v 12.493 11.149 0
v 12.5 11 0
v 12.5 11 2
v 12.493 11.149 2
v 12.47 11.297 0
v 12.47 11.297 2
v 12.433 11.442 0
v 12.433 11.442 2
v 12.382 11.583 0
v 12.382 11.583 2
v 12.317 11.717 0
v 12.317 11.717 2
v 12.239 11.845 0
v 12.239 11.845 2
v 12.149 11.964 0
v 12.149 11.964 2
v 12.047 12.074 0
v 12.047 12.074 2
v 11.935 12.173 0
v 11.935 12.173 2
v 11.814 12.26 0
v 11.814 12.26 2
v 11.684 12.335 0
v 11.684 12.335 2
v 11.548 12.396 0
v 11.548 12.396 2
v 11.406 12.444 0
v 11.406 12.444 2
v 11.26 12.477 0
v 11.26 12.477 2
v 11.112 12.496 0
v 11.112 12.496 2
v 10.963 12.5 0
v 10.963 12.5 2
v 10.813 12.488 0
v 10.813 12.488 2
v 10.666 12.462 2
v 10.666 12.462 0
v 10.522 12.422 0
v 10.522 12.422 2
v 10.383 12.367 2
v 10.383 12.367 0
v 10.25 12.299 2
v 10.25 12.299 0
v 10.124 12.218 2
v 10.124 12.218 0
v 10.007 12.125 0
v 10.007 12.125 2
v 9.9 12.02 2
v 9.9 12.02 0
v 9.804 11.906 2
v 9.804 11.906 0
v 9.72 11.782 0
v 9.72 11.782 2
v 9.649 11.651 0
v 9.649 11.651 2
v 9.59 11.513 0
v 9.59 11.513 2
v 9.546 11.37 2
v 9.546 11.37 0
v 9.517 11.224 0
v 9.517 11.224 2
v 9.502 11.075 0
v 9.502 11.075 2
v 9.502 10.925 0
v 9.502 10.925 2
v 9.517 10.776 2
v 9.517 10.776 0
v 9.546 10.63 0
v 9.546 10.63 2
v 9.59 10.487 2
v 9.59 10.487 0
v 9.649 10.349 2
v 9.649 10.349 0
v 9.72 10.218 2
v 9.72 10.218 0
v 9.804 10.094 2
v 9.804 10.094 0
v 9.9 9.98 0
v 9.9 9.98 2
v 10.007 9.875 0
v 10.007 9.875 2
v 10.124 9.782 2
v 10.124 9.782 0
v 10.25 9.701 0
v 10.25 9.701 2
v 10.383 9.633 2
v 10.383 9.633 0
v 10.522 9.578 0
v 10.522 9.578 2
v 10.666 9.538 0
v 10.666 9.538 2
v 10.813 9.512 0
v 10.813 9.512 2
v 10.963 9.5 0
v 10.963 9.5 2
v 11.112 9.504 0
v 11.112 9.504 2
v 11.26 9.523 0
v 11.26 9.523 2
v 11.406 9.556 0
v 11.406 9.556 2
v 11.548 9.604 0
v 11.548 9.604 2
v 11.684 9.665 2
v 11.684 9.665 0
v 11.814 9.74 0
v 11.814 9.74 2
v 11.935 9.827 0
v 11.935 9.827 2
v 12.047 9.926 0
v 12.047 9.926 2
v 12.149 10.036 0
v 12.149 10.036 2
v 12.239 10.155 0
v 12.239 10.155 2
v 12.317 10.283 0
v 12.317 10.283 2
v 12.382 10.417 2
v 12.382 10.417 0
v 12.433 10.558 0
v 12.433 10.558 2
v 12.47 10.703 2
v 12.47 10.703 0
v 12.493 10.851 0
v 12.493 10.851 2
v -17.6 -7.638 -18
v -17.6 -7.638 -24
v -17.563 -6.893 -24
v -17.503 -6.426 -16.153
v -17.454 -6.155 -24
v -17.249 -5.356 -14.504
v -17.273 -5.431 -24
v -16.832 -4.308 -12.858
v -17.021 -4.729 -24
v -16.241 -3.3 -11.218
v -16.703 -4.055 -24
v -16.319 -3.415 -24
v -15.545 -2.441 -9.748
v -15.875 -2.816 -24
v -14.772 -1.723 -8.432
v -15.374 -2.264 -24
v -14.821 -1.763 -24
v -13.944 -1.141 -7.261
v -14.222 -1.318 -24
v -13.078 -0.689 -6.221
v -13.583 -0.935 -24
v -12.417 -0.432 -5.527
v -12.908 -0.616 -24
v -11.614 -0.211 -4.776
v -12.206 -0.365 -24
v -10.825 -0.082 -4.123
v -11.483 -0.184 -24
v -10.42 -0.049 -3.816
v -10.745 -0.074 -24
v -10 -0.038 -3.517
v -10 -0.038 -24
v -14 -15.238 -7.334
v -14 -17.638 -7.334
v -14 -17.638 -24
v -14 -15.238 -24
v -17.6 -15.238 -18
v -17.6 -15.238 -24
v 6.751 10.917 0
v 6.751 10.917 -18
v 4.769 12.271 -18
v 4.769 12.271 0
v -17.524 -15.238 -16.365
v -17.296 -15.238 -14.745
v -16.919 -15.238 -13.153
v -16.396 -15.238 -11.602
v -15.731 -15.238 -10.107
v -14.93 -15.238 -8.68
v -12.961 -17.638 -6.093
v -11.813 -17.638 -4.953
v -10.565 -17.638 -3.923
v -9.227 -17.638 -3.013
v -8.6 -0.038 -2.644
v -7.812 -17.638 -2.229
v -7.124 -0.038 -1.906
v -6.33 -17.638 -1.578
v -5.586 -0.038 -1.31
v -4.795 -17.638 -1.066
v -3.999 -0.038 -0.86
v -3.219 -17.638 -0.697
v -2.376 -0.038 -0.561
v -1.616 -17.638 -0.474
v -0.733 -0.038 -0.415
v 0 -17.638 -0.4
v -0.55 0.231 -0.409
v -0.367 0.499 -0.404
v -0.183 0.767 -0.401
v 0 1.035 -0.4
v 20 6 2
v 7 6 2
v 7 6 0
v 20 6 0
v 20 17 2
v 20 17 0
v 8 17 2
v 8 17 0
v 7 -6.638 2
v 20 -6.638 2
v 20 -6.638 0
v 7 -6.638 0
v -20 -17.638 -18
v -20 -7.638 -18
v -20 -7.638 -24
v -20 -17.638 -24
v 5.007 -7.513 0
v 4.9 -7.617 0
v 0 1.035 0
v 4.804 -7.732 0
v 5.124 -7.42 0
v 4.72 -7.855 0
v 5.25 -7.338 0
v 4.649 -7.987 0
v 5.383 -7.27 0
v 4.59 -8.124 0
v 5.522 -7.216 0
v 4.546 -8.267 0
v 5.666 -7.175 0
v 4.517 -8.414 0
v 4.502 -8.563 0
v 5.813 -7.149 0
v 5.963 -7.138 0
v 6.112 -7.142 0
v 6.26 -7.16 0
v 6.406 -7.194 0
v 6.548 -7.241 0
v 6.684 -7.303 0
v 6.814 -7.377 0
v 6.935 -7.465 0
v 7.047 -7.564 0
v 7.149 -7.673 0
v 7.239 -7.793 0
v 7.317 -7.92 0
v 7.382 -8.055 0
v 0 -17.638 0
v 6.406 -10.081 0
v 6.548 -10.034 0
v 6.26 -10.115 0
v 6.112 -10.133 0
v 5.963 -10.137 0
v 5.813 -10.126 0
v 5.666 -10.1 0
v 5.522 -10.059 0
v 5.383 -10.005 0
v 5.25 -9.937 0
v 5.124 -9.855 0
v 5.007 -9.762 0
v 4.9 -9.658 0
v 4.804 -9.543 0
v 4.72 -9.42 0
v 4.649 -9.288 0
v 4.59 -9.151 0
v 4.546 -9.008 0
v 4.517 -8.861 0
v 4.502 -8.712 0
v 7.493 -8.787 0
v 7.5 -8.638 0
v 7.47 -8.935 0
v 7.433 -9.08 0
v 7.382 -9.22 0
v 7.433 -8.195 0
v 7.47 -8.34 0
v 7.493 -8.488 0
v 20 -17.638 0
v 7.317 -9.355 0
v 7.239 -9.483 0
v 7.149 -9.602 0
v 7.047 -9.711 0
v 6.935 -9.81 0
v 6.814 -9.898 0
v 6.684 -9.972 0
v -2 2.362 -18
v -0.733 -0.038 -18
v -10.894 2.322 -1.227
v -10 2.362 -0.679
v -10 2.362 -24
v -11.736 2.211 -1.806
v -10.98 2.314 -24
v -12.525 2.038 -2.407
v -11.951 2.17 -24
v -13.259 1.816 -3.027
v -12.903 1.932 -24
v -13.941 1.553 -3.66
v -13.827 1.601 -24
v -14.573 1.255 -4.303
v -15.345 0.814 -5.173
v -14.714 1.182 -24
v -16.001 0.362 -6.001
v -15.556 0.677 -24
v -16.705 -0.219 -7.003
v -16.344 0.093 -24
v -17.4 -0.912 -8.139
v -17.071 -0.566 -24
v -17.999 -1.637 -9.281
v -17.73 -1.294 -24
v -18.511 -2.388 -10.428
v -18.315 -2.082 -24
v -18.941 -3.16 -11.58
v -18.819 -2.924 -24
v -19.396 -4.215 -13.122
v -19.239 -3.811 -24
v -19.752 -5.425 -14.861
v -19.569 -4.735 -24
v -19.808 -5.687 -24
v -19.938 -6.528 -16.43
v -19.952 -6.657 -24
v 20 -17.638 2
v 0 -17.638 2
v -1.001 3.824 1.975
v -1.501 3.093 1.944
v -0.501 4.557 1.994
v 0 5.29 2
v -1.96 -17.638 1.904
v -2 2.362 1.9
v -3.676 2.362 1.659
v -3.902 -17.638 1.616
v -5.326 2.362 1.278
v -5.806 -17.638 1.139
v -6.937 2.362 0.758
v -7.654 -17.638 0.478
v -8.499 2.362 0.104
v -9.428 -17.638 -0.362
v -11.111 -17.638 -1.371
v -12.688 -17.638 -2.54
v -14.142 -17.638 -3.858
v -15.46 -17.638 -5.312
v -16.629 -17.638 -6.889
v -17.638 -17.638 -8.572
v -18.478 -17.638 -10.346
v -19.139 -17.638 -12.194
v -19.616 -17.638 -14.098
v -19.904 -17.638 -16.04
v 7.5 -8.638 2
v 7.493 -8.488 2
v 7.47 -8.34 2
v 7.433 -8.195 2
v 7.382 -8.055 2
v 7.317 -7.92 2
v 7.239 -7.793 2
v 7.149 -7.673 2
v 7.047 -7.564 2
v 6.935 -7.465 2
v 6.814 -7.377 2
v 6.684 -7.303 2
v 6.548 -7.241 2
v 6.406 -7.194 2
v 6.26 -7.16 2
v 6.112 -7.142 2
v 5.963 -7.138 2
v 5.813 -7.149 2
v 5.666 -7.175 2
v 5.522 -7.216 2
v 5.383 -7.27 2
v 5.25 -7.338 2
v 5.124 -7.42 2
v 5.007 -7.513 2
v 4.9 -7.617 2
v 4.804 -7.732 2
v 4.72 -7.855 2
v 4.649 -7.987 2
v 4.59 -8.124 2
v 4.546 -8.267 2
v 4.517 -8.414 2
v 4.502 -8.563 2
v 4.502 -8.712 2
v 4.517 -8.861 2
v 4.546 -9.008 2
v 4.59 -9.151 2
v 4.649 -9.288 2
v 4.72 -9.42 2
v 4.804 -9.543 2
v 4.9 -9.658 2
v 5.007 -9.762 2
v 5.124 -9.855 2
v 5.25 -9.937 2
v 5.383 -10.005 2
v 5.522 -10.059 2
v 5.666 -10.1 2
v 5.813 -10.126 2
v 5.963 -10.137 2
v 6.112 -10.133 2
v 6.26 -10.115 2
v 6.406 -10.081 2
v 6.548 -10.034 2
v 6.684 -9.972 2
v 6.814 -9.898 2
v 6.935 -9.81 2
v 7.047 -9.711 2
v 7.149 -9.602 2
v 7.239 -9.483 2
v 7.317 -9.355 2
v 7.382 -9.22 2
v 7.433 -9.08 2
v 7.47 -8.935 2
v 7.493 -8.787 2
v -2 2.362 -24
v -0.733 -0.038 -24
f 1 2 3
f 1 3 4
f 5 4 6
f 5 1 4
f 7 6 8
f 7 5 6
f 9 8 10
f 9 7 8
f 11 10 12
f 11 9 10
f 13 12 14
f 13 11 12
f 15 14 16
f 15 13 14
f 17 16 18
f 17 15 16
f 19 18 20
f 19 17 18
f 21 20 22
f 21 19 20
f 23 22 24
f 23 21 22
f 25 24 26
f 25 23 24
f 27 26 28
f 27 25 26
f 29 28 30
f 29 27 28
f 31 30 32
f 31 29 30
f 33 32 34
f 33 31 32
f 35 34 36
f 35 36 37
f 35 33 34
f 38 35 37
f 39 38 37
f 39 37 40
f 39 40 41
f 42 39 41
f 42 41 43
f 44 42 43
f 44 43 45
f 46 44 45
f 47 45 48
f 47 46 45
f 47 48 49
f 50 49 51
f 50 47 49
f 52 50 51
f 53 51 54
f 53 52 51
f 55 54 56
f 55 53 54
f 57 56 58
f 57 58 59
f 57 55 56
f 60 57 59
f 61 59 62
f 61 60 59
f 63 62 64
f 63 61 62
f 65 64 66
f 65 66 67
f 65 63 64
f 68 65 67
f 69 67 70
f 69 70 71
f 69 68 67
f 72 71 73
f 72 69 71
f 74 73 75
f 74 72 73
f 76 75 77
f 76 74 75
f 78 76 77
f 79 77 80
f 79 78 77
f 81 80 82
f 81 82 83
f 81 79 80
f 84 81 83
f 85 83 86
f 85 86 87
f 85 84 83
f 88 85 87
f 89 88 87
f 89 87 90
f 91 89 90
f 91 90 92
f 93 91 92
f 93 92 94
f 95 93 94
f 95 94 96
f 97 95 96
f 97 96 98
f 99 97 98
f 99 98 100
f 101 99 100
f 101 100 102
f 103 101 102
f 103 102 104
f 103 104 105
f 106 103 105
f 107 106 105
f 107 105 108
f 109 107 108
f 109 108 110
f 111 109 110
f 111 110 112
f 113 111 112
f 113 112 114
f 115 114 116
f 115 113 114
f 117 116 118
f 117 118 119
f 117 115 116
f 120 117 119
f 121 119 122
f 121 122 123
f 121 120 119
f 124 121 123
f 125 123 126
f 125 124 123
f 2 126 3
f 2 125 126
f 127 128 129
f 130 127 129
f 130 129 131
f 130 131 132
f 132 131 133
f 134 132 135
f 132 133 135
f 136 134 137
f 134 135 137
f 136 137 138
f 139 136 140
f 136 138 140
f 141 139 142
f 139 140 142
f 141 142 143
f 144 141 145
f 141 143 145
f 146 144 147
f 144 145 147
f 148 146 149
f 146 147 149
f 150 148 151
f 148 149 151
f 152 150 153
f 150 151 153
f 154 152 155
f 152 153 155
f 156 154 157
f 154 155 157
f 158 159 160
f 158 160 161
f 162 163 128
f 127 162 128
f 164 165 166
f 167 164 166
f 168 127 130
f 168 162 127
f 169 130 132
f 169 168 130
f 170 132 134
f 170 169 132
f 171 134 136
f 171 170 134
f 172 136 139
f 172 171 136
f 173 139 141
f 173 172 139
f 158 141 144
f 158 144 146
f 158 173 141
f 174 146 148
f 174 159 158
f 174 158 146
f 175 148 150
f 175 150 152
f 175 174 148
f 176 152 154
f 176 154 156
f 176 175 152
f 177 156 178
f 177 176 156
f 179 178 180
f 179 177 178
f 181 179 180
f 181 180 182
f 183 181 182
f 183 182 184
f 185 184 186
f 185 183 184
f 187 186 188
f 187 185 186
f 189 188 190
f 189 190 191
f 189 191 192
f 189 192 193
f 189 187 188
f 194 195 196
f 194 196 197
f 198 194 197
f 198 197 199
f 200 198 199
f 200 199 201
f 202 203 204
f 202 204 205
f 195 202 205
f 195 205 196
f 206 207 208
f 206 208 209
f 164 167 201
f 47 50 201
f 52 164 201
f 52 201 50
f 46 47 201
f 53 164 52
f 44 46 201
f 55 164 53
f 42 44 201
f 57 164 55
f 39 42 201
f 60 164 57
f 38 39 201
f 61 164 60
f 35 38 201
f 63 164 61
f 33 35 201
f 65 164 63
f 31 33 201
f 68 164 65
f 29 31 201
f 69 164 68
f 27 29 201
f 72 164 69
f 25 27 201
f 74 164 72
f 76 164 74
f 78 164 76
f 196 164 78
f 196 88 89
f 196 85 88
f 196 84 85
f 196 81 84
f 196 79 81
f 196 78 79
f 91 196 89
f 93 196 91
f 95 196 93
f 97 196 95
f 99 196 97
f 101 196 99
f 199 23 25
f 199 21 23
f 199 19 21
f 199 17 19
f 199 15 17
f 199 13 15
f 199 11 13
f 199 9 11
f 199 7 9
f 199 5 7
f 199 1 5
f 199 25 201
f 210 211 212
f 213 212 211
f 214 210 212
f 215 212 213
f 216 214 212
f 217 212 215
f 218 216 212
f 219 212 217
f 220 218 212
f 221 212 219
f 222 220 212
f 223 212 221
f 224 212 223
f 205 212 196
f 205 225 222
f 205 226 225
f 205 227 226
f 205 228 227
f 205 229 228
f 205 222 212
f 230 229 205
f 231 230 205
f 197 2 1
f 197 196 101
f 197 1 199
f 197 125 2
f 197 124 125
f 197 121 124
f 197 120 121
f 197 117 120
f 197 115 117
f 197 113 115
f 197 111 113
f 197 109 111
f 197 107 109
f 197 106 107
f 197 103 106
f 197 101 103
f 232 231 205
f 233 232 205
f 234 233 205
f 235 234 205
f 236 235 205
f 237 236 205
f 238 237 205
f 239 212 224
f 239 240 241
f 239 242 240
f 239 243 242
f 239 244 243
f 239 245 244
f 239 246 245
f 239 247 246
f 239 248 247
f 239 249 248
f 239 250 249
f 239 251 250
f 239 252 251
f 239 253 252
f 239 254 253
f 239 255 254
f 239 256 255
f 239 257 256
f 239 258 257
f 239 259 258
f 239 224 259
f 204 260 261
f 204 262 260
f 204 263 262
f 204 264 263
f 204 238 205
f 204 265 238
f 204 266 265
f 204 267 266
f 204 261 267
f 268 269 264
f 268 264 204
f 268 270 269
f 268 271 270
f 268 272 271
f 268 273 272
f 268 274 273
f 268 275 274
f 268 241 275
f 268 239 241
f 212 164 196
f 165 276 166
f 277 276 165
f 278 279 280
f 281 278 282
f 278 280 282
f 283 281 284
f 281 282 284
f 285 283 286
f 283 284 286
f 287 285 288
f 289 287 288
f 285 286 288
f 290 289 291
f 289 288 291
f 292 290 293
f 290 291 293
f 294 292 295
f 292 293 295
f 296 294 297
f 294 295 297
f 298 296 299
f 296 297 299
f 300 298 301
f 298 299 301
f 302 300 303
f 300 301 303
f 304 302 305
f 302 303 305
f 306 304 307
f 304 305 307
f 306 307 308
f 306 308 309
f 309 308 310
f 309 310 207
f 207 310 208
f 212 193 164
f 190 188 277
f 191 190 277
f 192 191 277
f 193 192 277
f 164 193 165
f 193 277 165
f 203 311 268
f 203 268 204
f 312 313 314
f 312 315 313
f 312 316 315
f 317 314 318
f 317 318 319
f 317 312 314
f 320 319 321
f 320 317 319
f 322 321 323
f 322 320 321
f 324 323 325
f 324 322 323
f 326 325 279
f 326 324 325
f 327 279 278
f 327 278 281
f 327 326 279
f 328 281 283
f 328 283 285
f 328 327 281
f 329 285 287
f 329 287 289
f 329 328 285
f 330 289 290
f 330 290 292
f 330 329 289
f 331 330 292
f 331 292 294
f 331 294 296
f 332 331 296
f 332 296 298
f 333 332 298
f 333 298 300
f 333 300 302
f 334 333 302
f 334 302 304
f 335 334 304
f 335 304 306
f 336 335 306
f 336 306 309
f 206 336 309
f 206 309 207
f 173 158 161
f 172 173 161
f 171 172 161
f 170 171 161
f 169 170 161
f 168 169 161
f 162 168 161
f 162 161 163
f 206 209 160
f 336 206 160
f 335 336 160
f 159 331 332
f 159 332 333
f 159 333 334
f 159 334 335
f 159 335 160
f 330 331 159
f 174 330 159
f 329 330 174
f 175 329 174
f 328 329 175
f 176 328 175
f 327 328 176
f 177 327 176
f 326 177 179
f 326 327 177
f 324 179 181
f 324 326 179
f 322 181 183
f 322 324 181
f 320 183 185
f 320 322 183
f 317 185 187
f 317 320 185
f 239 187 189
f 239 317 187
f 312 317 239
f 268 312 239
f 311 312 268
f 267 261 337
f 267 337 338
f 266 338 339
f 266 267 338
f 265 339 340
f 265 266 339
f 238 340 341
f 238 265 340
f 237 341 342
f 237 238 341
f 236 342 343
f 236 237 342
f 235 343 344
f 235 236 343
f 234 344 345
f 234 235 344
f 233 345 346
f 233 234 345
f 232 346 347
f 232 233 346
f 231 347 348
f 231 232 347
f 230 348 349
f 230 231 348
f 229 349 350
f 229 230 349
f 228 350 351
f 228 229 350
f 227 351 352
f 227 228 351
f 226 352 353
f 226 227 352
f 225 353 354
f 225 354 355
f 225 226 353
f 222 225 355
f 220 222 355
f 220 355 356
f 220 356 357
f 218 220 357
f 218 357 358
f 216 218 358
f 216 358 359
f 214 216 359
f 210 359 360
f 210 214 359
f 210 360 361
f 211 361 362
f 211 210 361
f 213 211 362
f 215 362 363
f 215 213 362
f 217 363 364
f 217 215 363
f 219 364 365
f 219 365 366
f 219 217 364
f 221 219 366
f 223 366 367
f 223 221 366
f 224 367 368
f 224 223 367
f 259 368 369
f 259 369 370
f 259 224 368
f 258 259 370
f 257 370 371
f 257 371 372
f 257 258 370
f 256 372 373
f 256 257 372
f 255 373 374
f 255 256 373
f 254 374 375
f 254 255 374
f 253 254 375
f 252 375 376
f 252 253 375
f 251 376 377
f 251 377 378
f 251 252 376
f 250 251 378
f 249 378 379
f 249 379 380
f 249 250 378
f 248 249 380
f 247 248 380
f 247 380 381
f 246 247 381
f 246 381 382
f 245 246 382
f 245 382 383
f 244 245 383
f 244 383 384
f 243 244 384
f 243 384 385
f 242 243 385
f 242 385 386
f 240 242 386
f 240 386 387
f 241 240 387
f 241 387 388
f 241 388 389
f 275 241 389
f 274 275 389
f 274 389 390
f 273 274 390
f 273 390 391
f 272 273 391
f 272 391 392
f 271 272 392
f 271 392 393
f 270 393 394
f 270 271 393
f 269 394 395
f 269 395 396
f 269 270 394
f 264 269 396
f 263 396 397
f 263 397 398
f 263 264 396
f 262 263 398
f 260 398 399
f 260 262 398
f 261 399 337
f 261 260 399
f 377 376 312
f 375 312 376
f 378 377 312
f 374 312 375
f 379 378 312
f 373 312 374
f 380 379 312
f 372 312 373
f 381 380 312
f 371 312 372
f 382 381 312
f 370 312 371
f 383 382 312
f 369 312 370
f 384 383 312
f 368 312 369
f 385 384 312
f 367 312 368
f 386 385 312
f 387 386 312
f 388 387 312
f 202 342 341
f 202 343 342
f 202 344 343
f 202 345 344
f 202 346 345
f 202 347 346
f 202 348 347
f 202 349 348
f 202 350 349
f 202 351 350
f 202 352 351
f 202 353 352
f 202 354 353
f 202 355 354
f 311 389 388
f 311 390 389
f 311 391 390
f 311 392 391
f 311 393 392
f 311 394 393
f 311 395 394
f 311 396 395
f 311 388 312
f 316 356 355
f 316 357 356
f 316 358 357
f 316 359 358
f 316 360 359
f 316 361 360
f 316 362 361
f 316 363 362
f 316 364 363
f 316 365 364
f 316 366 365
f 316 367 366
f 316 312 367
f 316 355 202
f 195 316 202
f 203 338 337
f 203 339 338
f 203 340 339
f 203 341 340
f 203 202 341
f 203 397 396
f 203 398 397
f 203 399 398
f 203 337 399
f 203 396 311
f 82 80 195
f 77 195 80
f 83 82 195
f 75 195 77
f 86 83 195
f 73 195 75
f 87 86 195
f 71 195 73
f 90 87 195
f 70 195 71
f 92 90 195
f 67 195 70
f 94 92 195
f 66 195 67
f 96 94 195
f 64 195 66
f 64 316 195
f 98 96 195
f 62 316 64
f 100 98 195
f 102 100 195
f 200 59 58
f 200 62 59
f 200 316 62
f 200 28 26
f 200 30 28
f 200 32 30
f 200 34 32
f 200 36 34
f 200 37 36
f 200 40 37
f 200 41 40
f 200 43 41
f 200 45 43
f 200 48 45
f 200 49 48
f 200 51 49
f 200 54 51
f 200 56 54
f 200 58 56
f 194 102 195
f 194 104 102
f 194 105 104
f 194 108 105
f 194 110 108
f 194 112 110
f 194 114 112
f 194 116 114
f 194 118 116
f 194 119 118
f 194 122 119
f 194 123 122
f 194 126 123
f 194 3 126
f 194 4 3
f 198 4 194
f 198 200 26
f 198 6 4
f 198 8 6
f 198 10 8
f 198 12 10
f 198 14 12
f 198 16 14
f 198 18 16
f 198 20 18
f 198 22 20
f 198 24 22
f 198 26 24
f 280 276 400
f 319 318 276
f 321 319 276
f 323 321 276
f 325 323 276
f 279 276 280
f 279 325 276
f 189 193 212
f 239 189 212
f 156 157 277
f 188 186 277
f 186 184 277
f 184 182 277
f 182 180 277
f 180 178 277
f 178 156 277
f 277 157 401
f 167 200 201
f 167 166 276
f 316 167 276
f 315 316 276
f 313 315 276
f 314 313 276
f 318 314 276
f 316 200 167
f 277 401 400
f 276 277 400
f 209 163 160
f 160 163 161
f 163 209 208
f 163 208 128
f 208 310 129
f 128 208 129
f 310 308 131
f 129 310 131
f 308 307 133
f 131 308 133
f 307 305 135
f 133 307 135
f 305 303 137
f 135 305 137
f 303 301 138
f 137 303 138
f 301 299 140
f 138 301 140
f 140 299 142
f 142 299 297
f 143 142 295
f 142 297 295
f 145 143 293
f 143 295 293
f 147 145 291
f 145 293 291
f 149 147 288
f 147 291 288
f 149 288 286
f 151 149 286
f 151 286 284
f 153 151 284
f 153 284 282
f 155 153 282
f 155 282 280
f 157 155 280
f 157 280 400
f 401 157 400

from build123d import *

# Parameters (mm, degrees)
F0_R      = 1.5
F1_DEPTH  = 2
F2_DEPTH  = 24
F4_DEPTH  = 25
F5_R      = 1.5
F6_DEPTH  = 24
F8_DEPTH  = 20
F10_DEPTH = 25
F11_DEPTH = 6


# Not quite as in the source:
# - a feature names something its author has since deleted; it is built from what else it names


with BuildPart() as f1:
    # F0 (on Top) → F1 (new body)
    with BuildSketch(Plane.XY):
        with BuildLine():
            Line((-20, -17.6375247538), (20, -17.6375247538))
            Line((20, -17.6375247538), (20, -6.6375247538))
            Line((20, -6.6375247538), (7, -6.6375247538))
            Line((7, -6.6375247538), (7, 6))
            Line((7, 6), (20, 6))
            Line((20, 6), (20, 17))
            Line((20, 17), (8, 17))
            Line((8, 17), (-2, 2.3624752462))
            Line((-2, 2.3624752462), (-10, 2.3624752462))
            ThreePointArc((-10, 2.3624752462), (-17.0710678119, -0.5664569419), (-20, -7.6375247538))
            Line((-20, -7.6375247538), (-20, -17.6375247538))
        make_face()
        with Locations((6, -8.6375247538)):
            Circle(F0_R, mode=Mode.SUBTRACT)
        with Locations((11, 11)):
            Circle(F0_R, mode=Mode.SUBTRACT)
    extrude(amount=F1_DEPTH)

    # F2 (add): a face of the model
    f2_faces = [f1.faces().sort_by_distance(p)[0] for p in [
        (0.9940051369, -4.5309976768, 0),
    ]]
    extrude(f2_faces, amount=F2_DEPTH)

    # F3 (on face) → F4 (cut)
    with BuildSketch(Plane.XZ.offset(17.6375247538)):
        with BuildLine():
            Line((-20, -11), (-20, -18))
            ThreePointArc((-20, -18), (-14.1421356237, -3.8578643763), (0, 2))
            Line((0, 2), (-7, 2))
            Line((-7, 2), (-20, 2))
            Line((-20, 2), (-20, -11))
        make_face()
    extrude(amount=-F4_DEPTH, mode=Mode.SUBTRACT)

    # F5 (on face) → F6 (cut)
    with BuildSketch(Plane(origin=(0, 0, -24), x_dir=(1, 0, 0), z_dir=(0, 0, -1))):
        with BuildLine():
            Line((20, 17.6375247538), (-14, 17.6375247538))
            Line((-14, 17.6375247538), (-14, 15.2375247538))
            Line((-14, 15.2375247538), (-17.6, 15.2375247538))
            Line((-17.6, 15.2375247538), (-17.6, 7.6375247538))
            ThreePointArc((-17.6, 7.6375247538), (-15.374011537, 2.2635132168), (-10, 0.0375247538))
            Line((-10, 0.0375247538), (-0.7330154527, 0.0375247538))
            Line((-0.7330154527, 0.0375247538), (6.7509134438, -10.9170946941))
            Line((6.7509134438, -10.9170946941), (4.7692207252, -12.2709388392))
            Line((4.7692207252, -12.2709388392), (8, -17))
            Line((8, -17), (20, -17))
            Line((20, -17), (20, -6))
            Line((20, -6), (7, -6))
            Line((7, -6), (7, 6.6375247538))
            Line((7, 6.6375247538), (20, 6.6375247538))
            Line((20, 6.6375247538), (20, 17.6375247538))
        make_face()
        with Locations((11, -11)):
            Circle(F5_R, mode=Mode.SUBTRACT)
        with Locations((6, 8.6375247538)):
            Circle(F5_R, mode=Mode.SUBTRACT)
    extrude(amount=-F6_DEPTH, mode=Mode.SUBTRACT)

    # F7 (on face) → F8 (join)
    with BuildSketch(Plane.XZ.offset(17.6375247538)):
        with BuildLine():
            Line((0, -0.4), (0, 2))
            ThreePointArc((0, 2), (-14.1421356237, -3.8578643763), (-20, -18))
            Line((-20, -18), (-17.6, -18))
            ThreePointArc((-17.6, -18), (-12.4450793489, -5.5549206511), (0, -0.4))
        make_face()
    extrude(amount=-F8_DEPTH)

    # F9 (on face) → F10 (cut)
    with BuildSketch(Plane(origin=(0, 0, -24), x_dir=(1, 0, 0), z_dir=(0, 0, -1))):
        with BuildLine():
            ThreePointArc((-25, 7.6375247538), (-20.6066017178, -2.969076964), (-10, -7.3624752462))
            Line((-10, -7.3624752462), (-10, -2.3624752462))
            ThreePointArc((-10, -2.3624752462), (-17.0710678119, 0.5664569419), (-20, 7.6375247538))
            Line((-20, 7.6375247538), (-25, 7.6375247538))
        make_face()
    extrude(amount=-F10_DEPTH, mode=Mode.SUBTRACT)

    # F5 (on face) → F11 (cut)
    with BuildSketch(Plane(origin=(0, 0, -24), x_dir=(1, 0, 0), z_dir=(0, 0, -1))):
        Polygon((-0.7330154527, 0.0375247538), (-2, -2.3624752462), (4.7692207252, -12.2709388392), (6.7509134438, -10.9170946941), align=None)
    extrude(amount=-F11_DEPTH, mode=Mode.SUBTRACT)


solid = f1.part
